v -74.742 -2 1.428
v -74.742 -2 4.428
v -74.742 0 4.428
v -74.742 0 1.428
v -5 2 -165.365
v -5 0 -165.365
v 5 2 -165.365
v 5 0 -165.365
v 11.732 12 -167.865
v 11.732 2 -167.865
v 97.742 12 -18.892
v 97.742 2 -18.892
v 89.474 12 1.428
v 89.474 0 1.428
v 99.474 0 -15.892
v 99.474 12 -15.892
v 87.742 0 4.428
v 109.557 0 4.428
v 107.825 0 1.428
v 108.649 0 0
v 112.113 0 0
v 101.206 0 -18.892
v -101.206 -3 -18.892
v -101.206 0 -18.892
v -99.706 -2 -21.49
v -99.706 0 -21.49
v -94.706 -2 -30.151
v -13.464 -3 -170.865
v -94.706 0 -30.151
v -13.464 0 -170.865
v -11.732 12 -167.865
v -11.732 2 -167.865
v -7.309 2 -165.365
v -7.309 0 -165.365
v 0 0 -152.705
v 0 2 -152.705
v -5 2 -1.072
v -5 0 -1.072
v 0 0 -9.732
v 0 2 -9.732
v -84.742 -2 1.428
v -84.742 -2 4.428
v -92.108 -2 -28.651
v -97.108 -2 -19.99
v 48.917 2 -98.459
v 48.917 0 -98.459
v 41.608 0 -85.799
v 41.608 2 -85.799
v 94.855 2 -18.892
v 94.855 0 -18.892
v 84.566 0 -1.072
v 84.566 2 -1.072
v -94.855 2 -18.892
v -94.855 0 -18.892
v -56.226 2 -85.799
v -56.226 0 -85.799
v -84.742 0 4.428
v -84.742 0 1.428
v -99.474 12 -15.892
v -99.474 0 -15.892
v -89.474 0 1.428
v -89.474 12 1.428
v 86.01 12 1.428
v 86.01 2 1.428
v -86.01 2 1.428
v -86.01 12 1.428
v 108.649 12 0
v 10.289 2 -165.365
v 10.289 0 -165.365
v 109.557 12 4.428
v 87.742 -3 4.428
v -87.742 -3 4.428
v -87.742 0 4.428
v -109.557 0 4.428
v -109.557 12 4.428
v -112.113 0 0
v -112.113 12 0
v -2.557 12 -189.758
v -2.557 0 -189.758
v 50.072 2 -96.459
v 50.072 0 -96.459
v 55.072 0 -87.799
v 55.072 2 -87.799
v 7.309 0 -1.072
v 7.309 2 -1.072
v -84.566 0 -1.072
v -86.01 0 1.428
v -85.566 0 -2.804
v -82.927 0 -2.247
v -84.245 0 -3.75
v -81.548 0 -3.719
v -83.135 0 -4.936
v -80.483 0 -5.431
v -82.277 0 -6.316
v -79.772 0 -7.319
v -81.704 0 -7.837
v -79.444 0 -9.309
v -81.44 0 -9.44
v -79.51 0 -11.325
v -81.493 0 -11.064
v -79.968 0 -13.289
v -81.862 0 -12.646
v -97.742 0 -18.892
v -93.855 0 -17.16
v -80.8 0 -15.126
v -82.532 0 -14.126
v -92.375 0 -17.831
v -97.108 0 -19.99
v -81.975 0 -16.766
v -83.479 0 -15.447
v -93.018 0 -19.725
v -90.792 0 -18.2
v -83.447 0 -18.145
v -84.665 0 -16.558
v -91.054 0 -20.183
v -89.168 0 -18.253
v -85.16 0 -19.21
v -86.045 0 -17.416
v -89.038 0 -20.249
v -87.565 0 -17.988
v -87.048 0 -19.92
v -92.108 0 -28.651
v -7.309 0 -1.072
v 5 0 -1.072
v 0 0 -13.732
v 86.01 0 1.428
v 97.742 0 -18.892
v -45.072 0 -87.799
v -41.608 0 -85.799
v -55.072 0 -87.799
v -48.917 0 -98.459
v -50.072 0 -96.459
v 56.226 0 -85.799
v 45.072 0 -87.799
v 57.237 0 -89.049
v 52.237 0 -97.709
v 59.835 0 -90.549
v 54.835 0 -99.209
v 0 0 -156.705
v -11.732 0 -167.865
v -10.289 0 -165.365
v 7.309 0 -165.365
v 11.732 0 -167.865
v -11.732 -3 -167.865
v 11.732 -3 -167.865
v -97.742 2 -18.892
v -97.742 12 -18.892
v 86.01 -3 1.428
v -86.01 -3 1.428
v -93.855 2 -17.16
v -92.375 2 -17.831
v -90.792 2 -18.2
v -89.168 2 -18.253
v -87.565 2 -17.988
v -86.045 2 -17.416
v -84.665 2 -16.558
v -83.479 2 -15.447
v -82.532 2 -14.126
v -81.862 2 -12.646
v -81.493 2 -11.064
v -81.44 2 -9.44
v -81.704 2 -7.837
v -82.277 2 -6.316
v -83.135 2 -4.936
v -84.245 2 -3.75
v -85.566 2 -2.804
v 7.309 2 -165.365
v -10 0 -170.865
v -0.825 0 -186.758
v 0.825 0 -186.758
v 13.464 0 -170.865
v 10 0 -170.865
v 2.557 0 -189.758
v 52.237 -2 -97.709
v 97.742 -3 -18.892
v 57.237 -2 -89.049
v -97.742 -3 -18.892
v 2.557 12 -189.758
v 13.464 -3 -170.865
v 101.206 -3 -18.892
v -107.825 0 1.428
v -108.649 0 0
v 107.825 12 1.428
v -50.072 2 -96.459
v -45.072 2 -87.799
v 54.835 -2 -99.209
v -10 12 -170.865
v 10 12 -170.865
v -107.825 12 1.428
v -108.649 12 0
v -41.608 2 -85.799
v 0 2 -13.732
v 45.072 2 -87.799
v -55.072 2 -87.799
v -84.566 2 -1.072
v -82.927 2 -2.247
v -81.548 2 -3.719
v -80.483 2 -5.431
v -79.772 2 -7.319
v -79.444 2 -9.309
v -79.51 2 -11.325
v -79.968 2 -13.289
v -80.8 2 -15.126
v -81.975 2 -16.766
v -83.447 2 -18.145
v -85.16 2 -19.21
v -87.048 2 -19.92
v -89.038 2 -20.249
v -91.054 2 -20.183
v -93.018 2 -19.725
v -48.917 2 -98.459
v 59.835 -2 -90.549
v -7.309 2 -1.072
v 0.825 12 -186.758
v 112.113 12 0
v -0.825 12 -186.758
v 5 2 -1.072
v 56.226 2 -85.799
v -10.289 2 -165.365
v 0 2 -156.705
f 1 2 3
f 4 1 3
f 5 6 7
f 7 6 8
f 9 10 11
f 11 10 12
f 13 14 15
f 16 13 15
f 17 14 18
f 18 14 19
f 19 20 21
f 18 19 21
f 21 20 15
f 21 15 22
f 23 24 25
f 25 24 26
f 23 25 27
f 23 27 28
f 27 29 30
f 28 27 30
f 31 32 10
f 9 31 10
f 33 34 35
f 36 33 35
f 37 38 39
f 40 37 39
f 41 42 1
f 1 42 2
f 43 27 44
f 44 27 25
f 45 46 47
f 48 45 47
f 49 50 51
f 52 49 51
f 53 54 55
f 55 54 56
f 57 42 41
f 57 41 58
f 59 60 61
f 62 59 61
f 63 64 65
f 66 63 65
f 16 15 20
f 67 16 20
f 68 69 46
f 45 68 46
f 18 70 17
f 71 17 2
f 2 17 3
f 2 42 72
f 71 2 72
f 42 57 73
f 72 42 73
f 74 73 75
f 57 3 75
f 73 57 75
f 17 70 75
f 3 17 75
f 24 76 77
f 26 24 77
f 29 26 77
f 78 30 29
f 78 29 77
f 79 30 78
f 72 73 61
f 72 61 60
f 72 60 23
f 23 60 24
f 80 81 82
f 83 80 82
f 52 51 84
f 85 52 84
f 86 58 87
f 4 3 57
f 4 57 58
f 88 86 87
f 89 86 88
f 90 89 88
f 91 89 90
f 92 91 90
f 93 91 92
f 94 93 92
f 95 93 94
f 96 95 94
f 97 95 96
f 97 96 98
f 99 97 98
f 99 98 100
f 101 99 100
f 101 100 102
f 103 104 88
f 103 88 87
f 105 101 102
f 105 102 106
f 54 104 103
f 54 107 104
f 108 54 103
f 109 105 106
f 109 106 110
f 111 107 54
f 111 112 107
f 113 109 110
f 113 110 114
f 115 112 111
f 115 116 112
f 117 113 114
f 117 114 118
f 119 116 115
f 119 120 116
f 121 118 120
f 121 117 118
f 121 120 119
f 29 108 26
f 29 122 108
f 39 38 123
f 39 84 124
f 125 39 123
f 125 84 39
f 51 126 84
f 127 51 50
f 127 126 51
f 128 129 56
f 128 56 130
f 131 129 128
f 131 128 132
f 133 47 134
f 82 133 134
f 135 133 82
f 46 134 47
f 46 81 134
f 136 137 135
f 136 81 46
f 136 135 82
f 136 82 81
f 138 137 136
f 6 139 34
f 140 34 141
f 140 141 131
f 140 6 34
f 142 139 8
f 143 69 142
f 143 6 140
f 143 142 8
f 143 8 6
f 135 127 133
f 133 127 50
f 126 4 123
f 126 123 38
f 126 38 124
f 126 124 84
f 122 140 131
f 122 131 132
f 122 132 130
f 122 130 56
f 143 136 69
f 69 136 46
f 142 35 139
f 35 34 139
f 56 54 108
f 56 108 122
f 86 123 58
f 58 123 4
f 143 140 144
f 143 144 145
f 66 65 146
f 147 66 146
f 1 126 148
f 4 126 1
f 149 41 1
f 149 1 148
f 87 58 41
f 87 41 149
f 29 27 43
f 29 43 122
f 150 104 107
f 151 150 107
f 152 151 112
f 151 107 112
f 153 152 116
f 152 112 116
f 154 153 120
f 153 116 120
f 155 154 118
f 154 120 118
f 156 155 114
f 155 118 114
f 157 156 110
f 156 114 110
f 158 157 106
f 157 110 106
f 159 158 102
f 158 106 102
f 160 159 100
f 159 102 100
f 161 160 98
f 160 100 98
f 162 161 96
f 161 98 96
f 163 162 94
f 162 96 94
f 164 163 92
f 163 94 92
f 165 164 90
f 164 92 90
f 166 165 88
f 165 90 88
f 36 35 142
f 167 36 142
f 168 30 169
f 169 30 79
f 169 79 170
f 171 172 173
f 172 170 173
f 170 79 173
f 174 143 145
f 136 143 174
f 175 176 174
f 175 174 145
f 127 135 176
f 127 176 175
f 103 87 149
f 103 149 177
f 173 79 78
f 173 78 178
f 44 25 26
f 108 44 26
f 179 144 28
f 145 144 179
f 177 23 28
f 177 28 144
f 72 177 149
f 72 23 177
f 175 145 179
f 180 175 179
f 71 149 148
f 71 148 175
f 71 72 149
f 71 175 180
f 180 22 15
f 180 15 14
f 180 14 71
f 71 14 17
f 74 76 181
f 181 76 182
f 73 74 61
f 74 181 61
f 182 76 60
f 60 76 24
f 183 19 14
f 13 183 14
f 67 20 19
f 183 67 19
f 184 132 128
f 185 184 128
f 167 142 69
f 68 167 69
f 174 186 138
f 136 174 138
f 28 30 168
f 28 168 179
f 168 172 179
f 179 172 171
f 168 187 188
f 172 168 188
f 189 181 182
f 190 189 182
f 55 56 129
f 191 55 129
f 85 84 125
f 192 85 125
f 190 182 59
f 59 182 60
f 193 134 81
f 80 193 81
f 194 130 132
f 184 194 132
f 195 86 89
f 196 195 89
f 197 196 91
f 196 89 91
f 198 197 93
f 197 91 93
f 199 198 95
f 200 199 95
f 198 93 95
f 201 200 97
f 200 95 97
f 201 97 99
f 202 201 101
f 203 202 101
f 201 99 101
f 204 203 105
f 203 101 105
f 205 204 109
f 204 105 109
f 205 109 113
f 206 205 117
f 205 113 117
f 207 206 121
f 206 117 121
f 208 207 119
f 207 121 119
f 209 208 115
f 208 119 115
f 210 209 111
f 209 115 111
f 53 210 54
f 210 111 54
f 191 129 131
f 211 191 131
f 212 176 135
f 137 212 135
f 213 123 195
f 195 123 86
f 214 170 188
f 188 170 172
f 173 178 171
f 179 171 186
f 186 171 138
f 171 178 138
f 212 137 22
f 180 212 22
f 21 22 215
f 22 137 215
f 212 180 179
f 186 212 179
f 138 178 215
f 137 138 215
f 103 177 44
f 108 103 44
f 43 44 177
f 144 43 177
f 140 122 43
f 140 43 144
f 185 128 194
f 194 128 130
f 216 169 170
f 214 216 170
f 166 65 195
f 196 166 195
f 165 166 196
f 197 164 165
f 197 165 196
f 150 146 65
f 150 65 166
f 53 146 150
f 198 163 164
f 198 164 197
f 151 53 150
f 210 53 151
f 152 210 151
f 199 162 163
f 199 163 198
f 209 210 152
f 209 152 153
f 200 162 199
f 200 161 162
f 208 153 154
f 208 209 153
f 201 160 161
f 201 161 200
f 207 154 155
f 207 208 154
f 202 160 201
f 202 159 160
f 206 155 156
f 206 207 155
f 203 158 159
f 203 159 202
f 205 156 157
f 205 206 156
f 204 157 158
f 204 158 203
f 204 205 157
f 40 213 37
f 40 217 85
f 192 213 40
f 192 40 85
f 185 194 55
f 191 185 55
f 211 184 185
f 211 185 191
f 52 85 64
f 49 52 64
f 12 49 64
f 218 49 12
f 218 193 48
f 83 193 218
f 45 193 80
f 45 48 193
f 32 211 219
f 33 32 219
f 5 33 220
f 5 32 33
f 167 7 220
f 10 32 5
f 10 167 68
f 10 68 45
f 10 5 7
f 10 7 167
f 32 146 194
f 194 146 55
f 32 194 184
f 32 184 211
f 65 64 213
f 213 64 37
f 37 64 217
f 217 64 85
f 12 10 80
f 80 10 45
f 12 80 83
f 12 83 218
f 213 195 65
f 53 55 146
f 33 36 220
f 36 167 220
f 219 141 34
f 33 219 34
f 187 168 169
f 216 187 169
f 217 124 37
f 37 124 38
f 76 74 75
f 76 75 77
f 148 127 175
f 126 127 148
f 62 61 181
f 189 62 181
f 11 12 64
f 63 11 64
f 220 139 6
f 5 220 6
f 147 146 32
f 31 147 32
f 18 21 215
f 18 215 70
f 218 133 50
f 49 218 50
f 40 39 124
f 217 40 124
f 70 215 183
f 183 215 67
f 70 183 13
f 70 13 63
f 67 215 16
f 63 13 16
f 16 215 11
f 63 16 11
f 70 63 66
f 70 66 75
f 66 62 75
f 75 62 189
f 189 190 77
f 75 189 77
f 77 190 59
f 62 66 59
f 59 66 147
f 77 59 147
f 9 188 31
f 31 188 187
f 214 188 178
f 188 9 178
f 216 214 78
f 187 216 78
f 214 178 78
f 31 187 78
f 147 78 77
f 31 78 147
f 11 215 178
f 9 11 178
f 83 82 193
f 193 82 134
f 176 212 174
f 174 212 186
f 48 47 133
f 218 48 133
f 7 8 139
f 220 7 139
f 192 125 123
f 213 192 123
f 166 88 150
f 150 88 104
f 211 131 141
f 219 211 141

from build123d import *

# Parameters (mm, degrees)
BOSS_EXTRUDE1_DEPTH = 12
BOSS_EXTRUDE2_DEPTH = 2
BOSS_EXTRUDE3_DEPTH = 3
SKETCH4_W           = 10
SKETCH4_H           = 2
CUT_EXTRUDE1_DEPTH  = 6
SKETCH5_W           = 10
SKETCH5_H           = 2
CUT_EXTRUDE2_DEPTH  = 6
SKETCH6_W           = 10
SKETCH6_H           = 2
CUT_EXTRUDE3_DEPTH  = 6


with BuildPart() as part:
    # Sketch1 → Boss-Extrude1 (new body)
    with BuildSketch(Plane(origin=(0, 0, 0), x_dir=(1, 0, 0), z_dir=(0, 1, 0))):
        Polygon((109.556624327, -4.42820323), (-109.556624327, -4.42820323), (-112.113248654, 0), (-2.55662435, 189.757639654), (2.556624303, 189.757639654), (112.113248654, 0), align=None)
        Polygon((-107.82457352, -1.42820323), (-108.649147039, 0), (-99.473720558, 15.892304845), (-89.473720559, -1.42820323), align=None, mode=Mode.SUBTRACT)
        Polygon((-0.824573543, 186.757639627), (0.824573481, 186.757639627), (9.999999979, 170.86533478), (-10.000000021, 170.86533478), align=None, mode=Mode.SUBTRACT)
        Polygon((108.649147039, 0), (107.824573535, -1.428203221), (89.473720574, -1.428203221), (99.473720574, 15.892304855), align=None, mode=Mode.SUBTRACT)
        Polygon((-11.732050809, 167.865334805), (11.732050809, 167.865334805), (97.741669771, 18.892304864), (86.009618954, -1.428203229), (-86.009618944, -1.428203229), (-97.741669751, 18.892304845), align=None, mode=Mode.SUBTRACT)
    extrude(amount=BOSS_EXTRUDE1_DEPTH)

    # Sketch1<4> → Boss-Extrude2 (add)
    with BuildSketch(Plane(origin=(0, 0, 0), x_dir=(1, 0, 0), z_dir=(0, 1, 0))):
        Polygon((11.732050809, 167.865334805), (-11.732050809, 167.865334805), (-97.741669751, 18.892304845), (-86.009618944, -1.428203229), (86.009618954, -1.428203229), (97.741669771, 18.892304864), align=None)
        with BuildLine():
            Line((-85.566243251, 2.803847594), (-93.854918378, 17.160254041))
            ThreePointArc((-93.854918378, 17.160254041), (-82.532377591, 14.126388381), (-85.566243251, 2.803847594))
        make_face(mode=Mode.SUBTRACT)
        Polygon((-1e-08, 9.732050841), (4.99999999, 1.071796803), (-5.00000001, 1.071796803), align=None, mode=Mode.SUBTRACT)
        Polygon((-45.071796745, 87.798692801), (-55.071796745, 87.798692801), (-50.071796745, 96.458946839), align=None, mode=Mode.SUBTRACT)
        with BuildLine():
            Line((56.226497316, 85.798692796), (94.854918412, 18.892304841))
            Line((94.854918412, 18.892304841), (84.566243293, 1.071796793))
            Line((84.566243293, 1.071796793), (7.309401088, 1.071796793))
            Line((7.309401088, 1.071796793), (2e-09, 13.732050847))
            Line((2e-09, 13.732050847), (-7.309401077, 1.071796786))
            Line((-7.309401077, 1.071796786), (-84.566243251, 1.071796786))
            ThreePointArc((-84.566243251, 1.071796786), (-80.800326783, 15.126388381), (-94.854918378, 18.892304849))
            Line((-94.854918378, 18.892304849), (-56.226497283, 85.798692801))
            Line((-56.226497283, 85.798692801), (-41.60769513, 85.798692801))
            Line((-41.60769513, 85.798692801), (-48.917096207, 98.458946839))
            Line((-48.917096207, 98.458946839), (-10.288675112, 165.365334792))
            Line((-10.288675112, 165.365334792), (-7.309401077, 165.365334792))
            Line((-7.309401077, 165.365334792), (0, 152.705080754))
            Line((0, 152.705080754), (7.309401077, 165.365334792))
            Line((7.309401077, 165.365334792), (10.288675142, 165.365334792))
            Line((10.288675142, 165.365334792), (48.91709624, 98.458946834))
            Line((48.91709624, 98.458946834), (41.607695163, 85.798692796))
            Line((41.607695163, 85.798692796), (56.226497316, 85.798692796))
        make_face(mode=Mode.SUBTRACT)
        Polygon((45.071796778, 87.798692803), (50.071796778, 96.458946841), (55.071796778, 87.798692803), align=None, mode=Mode.SUBTRACT)
        Polygon((0, 156.705080761), (-5, 165.365334799), (5, 165.365334799), align=None, mode=Mode.SUBTRACT)
    extrude(amount=BOSS_EXTRUDE2_DEPTH)

    # Sketch2 → Boss-Extrude3 (add)
    with BuildSketch(Plane.XZ):
        Polygon((101.205771363, -18.892304847), (87.741669751, 4.42820323), (-87.741669751, 4.42820323), (-101.205771368, -18.892304847), (-13.464101652, -170.86533478), (13.464101609, -170.86533478), align=None)
        Polygon((-11.732050819, -167.865334802), (11.732050795, -167.865334802), (97.741669739, -18.892304852), (86.009618931, 1.42820323), (-86.009618931, 1.42820323), (-97.741669763, -18.892304852), align=None, mode=Mode.SUBTRACT)
    extrude(amount=BOSS_EXTRUDE3_DEPTH)

    # Sketch4 → Cut-Extrude1 (cut)
    with BuildSketch(Plane.XY.offset(4.42820323)):
        with Locations((-79.741669751, -1)):
            Rectangle(SKETCH4_W, SKETCH4_H)
    extrude(amount=-CUT_EXTRUDE1_DEPTH, mode=Mode.SUBTRACT)

    # Sketch5 → Cut-Extrude2 (cut)
    with BuildSketch(Plane(origin=(-84.084936503, 0, -48.546460711), x_dir=(-0.4999999998935114, 0, 0.86602540384592), z_dir=(-0.86602540384592, 0, -0.4999999998935114))):
        with Locations((26.241669739, -1)):
            Rectangle(SKETCH5_W, SKETCH5_H)
    extrude(amount=-CUT_EXTRUDE2_DEPTH, mode=Mode.SUBTRACT)

    # Sketch6 → Cut-Extrude3 (cut)
    with BuildSketch(Plane(origin=(84.084936484, 0, -48.546460721), x_dir=(-0.5000000000540236, 0, -0.8660254037532481), z_dir=(0.8660254037532481, 0, -0.5000000000540236))):
        with Locations((53.499999991, -1)):
            Rectangle(SKETCH6_W, SKETCH6_H)
    extrude(amount=-CUT_EXTRUDE3_DEPTH, mode=Mode.SUBTRACT)


solid = part.part
